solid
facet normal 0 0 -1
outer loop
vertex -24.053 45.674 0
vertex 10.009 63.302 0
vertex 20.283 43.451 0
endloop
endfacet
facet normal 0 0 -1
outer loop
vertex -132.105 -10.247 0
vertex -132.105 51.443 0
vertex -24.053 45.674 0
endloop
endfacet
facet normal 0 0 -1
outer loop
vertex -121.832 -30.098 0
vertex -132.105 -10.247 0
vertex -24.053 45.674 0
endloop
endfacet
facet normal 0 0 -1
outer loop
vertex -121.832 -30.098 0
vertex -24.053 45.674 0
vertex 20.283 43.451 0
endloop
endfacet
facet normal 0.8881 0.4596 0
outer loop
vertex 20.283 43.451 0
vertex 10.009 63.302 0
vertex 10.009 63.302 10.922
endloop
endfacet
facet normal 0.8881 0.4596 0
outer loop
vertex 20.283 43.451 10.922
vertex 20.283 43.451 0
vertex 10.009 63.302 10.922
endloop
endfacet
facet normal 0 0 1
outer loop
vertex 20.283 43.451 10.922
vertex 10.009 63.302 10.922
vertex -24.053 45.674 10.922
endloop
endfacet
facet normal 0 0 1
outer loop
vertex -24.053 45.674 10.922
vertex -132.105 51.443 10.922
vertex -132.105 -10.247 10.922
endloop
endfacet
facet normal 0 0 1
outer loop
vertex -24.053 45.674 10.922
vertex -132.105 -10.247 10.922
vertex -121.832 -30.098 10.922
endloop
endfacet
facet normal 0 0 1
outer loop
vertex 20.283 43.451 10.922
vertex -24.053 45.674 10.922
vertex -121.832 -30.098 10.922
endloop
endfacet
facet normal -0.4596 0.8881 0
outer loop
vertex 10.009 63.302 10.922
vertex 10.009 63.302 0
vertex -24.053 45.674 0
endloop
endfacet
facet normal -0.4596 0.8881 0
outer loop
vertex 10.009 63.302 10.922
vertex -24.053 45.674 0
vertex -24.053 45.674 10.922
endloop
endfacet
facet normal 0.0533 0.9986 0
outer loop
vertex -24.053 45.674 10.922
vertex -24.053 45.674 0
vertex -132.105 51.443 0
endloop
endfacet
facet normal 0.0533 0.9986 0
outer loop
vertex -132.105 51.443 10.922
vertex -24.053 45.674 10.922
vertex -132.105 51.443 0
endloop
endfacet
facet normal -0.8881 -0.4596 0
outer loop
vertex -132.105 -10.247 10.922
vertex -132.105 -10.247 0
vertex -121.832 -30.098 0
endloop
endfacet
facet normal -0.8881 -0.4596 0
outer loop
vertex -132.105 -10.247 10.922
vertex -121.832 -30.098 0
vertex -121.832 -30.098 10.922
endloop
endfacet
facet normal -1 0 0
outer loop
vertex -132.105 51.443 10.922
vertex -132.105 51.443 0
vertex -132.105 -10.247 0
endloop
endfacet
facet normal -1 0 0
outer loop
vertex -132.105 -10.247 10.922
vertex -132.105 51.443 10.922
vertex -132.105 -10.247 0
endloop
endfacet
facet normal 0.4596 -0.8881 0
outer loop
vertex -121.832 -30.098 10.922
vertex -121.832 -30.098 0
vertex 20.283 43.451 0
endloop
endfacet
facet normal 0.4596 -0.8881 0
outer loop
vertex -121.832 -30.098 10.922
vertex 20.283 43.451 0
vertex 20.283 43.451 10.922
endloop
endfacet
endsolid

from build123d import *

# Parameters (mm, degrees)
F1_DEPTH = 10.922
F2_DEPTH = 22.352
F3_DEPTH = 38.354


with BuildPart() as f1:
    # F0 (on Top) → F1 (new body)
    with BuildSketch(Plane.XY):
        Polygon((-132.1051865816, 51.4431856573), (-132.1051865816, -10.2472146973), (-24.0534823388, 45.6737391651), align=None)
    extrude(amount=F1_DEPTH)

    # F2 (add): a face of the model
    f2_faces = [f1.faces().sort_by_distance(p)[0] for p in [
        (-78.0793344602, 17.7132622339, 5.461),
    ]]
    extrude(f2_faces, amount=F2_DEPTH)

    # F3 (add): a face of the model
    f3_faces = [f1.faces().sort_by_distance(p)[0] for p in [
        (-18.9166426466, 35.7482238648, 5.461),
    ]]
    extrude(f3_faces, amount=F3_DEPTH)


solid = f1.part
